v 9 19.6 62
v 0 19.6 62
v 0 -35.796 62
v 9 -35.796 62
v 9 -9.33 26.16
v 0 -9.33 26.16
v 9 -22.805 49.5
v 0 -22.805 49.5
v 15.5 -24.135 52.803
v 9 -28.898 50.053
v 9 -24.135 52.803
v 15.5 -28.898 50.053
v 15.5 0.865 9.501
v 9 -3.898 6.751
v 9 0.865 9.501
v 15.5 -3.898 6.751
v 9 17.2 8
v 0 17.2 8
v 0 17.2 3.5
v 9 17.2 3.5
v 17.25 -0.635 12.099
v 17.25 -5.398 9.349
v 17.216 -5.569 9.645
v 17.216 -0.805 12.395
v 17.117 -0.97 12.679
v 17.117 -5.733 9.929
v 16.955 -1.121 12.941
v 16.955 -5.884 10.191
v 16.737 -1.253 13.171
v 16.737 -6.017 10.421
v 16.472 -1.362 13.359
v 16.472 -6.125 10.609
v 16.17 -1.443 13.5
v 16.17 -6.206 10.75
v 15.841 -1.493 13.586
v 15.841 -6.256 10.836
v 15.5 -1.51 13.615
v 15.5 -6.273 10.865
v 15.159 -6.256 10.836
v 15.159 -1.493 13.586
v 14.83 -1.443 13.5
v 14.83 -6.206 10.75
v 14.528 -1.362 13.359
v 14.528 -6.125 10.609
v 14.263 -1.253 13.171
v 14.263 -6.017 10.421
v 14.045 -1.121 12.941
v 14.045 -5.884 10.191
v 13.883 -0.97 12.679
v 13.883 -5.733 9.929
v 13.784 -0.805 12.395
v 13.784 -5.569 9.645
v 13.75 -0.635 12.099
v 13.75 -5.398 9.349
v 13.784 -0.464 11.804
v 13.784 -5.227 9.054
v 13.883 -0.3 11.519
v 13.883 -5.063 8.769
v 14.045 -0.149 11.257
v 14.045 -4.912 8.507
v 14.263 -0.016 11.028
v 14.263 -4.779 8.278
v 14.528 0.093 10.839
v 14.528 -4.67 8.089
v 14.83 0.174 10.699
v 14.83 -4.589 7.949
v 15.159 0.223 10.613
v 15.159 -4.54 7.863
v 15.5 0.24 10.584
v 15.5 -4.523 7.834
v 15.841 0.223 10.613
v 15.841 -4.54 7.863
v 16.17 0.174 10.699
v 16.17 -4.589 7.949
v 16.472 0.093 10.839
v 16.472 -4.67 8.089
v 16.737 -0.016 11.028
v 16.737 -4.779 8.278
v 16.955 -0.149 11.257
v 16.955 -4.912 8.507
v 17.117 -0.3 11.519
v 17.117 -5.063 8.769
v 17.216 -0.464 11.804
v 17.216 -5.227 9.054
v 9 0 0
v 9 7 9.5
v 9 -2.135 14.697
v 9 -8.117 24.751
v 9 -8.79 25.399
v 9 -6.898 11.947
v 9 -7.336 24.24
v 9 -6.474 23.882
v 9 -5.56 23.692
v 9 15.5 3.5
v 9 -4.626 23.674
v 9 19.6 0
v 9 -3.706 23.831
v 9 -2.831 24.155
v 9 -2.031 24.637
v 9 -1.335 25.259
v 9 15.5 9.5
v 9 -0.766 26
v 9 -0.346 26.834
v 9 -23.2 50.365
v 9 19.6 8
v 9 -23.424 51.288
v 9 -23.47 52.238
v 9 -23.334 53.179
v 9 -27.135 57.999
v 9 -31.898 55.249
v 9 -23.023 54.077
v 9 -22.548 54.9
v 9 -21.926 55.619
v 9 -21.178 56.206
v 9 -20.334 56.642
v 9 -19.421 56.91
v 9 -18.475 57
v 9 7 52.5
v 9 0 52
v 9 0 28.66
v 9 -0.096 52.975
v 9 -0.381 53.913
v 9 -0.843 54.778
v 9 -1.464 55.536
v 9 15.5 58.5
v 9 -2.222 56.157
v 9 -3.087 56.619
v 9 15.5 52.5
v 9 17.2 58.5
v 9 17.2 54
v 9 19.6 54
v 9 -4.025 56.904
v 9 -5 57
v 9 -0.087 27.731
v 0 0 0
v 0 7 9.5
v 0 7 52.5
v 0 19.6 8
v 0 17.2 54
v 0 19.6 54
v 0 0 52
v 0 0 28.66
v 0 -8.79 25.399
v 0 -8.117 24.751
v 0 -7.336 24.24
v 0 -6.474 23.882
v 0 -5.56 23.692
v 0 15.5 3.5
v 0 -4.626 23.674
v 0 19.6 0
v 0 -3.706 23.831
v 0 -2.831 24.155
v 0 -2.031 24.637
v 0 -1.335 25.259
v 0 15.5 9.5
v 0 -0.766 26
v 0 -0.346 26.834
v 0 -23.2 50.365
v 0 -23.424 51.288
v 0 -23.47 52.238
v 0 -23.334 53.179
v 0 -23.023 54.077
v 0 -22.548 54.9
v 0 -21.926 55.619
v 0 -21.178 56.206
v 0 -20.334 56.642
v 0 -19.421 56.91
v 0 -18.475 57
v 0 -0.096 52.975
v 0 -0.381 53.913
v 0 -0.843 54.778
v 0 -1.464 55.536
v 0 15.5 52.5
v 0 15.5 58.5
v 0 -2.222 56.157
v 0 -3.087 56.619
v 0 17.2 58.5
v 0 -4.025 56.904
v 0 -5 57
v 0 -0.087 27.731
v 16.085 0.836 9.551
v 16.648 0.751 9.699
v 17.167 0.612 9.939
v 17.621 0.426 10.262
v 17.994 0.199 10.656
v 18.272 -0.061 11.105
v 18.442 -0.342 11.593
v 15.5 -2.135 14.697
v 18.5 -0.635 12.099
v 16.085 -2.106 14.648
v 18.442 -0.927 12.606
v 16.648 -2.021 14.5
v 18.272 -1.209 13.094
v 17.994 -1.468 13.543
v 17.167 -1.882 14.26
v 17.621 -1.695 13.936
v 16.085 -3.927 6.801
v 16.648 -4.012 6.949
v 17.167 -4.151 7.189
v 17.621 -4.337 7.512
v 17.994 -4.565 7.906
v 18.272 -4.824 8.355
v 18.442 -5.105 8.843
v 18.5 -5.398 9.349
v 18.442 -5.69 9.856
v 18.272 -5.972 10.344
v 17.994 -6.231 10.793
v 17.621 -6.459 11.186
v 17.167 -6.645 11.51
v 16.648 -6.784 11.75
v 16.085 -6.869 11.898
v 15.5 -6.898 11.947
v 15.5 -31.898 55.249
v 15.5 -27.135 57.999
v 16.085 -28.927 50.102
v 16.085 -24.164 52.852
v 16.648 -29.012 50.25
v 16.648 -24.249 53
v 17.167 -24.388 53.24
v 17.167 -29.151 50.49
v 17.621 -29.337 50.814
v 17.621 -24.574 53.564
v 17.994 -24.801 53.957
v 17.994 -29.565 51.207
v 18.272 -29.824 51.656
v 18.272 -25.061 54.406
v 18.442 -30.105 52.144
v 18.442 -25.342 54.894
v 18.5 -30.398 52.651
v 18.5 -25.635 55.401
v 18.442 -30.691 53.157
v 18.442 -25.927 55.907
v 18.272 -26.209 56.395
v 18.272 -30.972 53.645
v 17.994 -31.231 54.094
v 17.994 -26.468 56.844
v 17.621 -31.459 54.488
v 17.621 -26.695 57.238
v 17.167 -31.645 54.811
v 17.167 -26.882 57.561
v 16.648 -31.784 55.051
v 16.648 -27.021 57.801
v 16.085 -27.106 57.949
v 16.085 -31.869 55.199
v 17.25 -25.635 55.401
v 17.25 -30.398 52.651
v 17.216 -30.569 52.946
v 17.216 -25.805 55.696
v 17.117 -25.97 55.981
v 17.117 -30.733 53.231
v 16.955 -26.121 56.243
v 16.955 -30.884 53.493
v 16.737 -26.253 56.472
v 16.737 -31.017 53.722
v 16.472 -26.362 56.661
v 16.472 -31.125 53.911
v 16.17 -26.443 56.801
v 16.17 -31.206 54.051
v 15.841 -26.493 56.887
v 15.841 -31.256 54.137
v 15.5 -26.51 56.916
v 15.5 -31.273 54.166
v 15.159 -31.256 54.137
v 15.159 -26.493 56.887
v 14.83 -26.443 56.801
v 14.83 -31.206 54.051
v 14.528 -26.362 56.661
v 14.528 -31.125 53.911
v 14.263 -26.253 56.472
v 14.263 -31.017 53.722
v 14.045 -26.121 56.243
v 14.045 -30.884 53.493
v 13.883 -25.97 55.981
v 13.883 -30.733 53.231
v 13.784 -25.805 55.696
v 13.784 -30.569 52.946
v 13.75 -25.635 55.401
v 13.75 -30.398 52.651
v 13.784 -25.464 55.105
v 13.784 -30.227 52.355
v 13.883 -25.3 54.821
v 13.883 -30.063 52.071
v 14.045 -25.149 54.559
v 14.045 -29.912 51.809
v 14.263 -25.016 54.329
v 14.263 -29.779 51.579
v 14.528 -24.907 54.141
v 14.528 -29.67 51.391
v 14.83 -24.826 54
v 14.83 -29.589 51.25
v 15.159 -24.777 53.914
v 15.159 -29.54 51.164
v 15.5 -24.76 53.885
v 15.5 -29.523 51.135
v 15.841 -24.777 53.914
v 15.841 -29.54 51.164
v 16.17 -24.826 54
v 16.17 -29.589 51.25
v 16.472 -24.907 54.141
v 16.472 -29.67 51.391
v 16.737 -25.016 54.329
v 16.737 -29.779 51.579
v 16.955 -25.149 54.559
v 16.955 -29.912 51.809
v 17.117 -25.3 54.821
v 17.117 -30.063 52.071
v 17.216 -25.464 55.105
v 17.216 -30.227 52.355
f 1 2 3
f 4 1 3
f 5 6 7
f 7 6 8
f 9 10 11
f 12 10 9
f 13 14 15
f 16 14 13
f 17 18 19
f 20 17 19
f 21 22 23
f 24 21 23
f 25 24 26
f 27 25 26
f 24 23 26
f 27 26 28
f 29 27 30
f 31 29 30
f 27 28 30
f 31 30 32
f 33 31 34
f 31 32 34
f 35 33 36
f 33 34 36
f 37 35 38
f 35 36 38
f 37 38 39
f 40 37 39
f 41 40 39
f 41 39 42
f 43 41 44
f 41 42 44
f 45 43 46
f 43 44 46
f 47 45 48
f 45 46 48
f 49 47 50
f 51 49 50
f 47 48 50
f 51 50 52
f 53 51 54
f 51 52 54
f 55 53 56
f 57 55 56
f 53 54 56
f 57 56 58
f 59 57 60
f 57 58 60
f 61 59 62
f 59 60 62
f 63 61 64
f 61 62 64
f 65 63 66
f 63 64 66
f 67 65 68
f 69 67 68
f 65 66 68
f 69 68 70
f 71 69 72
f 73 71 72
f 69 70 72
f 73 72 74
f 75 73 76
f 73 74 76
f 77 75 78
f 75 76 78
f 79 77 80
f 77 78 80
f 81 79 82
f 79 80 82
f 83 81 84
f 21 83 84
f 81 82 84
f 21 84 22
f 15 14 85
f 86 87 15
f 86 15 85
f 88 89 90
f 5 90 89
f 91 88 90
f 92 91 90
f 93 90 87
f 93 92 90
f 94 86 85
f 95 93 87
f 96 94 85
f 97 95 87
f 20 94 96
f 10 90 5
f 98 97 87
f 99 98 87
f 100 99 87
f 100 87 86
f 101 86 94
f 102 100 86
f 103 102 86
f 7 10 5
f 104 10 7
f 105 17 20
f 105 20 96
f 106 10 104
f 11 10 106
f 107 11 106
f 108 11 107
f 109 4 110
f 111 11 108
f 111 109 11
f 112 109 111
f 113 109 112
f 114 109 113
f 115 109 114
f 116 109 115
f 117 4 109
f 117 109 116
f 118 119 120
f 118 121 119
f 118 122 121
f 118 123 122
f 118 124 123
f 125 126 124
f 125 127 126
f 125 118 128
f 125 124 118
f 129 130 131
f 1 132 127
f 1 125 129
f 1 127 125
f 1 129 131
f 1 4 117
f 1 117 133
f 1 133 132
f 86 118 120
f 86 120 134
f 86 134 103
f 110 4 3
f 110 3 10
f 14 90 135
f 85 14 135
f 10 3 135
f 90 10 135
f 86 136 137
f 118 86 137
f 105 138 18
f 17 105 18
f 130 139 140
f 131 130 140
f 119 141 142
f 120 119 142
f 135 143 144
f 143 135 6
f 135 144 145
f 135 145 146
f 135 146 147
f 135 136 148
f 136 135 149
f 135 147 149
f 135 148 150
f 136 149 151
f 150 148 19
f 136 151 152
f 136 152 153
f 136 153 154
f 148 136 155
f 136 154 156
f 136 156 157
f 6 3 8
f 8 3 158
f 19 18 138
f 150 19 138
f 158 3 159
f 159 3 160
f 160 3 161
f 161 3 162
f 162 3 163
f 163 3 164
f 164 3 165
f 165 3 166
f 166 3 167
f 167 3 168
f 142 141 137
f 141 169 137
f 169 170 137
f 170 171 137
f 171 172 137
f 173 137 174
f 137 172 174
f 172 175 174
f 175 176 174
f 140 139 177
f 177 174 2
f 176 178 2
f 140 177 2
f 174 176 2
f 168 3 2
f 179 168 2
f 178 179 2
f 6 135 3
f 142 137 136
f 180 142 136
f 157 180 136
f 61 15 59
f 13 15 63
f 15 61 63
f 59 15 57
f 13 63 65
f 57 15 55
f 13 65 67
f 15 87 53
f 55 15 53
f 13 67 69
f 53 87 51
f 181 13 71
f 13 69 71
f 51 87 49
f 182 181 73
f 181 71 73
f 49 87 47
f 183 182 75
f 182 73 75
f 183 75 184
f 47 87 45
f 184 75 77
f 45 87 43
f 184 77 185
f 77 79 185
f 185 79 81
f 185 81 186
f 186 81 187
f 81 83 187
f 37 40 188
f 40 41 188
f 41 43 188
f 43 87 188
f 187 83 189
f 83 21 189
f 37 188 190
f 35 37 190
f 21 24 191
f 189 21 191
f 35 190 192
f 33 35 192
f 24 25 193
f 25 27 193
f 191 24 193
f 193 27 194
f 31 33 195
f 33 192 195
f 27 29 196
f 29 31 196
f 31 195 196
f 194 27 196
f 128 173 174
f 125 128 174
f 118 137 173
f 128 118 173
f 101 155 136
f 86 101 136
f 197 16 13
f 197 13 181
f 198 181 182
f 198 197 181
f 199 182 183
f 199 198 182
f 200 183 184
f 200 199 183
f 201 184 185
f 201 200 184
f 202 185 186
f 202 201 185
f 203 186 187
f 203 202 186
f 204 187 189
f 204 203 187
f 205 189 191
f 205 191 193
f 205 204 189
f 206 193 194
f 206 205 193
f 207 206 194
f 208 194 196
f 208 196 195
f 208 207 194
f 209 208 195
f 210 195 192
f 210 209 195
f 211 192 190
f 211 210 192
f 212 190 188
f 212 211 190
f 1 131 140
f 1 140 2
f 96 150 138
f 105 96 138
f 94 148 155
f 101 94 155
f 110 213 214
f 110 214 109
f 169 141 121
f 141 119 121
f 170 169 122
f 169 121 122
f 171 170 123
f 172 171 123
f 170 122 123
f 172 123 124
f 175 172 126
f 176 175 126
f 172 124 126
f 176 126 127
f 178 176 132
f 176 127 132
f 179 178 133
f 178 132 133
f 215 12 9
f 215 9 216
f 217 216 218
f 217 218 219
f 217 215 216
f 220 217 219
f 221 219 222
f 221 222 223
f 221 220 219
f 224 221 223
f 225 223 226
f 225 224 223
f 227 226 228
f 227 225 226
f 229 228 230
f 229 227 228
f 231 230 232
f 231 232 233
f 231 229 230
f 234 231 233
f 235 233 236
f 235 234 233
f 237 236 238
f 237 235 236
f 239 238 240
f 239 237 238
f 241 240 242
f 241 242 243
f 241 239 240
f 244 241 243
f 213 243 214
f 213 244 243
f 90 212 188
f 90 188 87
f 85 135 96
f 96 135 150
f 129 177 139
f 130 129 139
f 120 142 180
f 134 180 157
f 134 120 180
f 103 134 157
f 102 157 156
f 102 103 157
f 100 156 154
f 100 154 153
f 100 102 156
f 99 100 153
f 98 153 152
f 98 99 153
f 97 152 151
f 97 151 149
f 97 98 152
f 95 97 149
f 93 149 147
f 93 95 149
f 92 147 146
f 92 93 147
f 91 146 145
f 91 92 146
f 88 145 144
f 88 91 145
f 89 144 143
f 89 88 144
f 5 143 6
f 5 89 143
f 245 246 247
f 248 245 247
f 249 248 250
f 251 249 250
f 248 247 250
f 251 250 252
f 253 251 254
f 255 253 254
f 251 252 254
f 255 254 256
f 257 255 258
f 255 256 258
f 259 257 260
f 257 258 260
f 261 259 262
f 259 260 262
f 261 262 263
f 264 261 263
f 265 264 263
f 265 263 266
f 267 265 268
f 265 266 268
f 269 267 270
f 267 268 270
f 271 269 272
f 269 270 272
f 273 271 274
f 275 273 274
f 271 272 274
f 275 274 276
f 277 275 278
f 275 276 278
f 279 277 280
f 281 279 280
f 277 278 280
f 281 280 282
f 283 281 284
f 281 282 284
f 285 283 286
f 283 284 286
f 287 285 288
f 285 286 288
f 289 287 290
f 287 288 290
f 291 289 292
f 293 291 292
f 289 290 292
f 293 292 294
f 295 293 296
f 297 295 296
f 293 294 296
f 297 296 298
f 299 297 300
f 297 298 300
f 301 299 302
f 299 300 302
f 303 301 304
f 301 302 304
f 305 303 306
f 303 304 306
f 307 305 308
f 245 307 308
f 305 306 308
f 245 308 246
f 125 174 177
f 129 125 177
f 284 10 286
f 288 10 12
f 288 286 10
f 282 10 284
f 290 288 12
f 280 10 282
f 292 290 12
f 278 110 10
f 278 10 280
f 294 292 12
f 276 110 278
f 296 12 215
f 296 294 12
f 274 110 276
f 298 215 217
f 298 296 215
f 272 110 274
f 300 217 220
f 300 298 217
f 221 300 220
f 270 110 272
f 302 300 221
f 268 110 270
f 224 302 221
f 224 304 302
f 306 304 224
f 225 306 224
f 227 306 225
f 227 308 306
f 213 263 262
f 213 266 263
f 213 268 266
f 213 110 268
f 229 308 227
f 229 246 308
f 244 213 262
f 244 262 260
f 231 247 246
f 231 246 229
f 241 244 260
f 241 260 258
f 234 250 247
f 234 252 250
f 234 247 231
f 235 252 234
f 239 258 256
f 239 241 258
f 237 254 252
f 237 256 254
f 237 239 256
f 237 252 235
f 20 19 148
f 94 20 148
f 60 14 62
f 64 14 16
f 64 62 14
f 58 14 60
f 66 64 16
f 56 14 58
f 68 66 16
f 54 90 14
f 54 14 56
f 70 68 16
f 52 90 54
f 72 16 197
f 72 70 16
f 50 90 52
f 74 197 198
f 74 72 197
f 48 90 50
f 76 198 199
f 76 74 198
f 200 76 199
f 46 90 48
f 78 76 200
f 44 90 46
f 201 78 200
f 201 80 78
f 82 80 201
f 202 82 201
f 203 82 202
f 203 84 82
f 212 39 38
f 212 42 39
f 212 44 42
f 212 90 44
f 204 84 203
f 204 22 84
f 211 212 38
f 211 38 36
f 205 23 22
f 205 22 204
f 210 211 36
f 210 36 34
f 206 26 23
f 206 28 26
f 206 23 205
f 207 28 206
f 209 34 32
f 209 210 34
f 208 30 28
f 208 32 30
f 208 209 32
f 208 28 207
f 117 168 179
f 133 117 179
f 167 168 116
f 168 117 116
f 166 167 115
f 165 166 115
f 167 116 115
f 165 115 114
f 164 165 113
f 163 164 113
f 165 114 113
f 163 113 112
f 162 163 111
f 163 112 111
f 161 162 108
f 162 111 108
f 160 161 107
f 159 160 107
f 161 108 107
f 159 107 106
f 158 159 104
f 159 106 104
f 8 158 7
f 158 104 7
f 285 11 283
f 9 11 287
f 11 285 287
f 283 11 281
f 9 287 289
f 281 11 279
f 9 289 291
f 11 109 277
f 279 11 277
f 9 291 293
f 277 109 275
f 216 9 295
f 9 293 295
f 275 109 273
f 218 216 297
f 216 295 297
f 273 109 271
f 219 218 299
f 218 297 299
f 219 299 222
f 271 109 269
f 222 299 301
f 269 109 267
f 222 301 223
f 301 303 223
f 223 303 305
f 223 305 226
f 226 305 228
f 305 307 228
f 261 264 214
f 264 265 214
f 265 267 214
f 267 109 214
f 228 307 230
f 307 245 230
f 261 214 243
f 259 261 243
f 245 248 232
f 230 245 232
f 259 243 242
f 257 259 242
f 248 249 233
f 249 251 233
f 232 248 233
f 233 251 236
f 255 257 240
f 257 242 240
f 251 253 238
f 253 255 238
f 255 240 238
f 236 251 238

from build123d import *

# Parameters (mm, degrees)
F1_DEPTH = 9
F2_R     = 5
F3_R     = 1.75
F4_DEPTH = 5.5


with BuildPart() as f1:
    # F0 (on Right) → F1 (new body)
    with BuildSketch(Plane.YZ):
        Polygon((17.2, 58.5), (17.2, 54), (19.6, 54), (19.6, 62), (-35.795717, 62), (0, 0), (19.6, 0), (19.6, 8), (17.2, 8), (17.2, 3.5), (15.5, 3.5), (15.5, 9.5), (7, 9.5), (7, 52.5), (15.5, 52.5), (15.5, 58.5), align=None)
        Polygon((0, 10), (-27.135463, 57), (0, 57), align=None, mode=Mode.SUBTRACT)
    extrude(amount=F1_DEPTH)

    # F2
    f2_edges = [f1.edges().sort_by_distance(p)[0] for p in [
        (4.5, 0, 57),
        (4.5, -27.135463, 57),
        (4.5, 0, 10),
    ]]
    fillet(f2_edges, radius=F2_R)

    # F3 (on face) → F4 (join)
    with BuildSketch(Plane(origin=(0, 0, 0), x_dir=(1, 0, 0), z_dir=(0, -0.866025, -0.5))):
        with BuildLine():
            Line((15.5, 63.795717), (9, 63.795717))
            Line((9, 63.795717), (9, 57.795717))
            Line((9, 57.795717), (15.5, 57.795717))
            ThreePointArc((15.5, 57.795717), (18.5, 60.795717), (15.5, 63.795717))
        make_face()
        with Locations((15.5, 60.795717)):
            Circle(F3_R, mode=Mode.SUBTRACT)
        with BuildLine():
            Line((15.5, 13.795717), (9, 13.795717))
            Line((9, 13.795717), (9, 7.795717))
            Line((9, 7.795717), (15.5, 7.795717))
            ThreePointArc((15.5, 7.795717), (18.5, 10.795717), (15.5, 13.795717))
        make_face()
        with Locations((15.5, 10.795717)):
            Circle(F3_R, mode=Mode.SUBTRACT)
    extrude(amount=-F4_DEPTH)


solid = f1.part
